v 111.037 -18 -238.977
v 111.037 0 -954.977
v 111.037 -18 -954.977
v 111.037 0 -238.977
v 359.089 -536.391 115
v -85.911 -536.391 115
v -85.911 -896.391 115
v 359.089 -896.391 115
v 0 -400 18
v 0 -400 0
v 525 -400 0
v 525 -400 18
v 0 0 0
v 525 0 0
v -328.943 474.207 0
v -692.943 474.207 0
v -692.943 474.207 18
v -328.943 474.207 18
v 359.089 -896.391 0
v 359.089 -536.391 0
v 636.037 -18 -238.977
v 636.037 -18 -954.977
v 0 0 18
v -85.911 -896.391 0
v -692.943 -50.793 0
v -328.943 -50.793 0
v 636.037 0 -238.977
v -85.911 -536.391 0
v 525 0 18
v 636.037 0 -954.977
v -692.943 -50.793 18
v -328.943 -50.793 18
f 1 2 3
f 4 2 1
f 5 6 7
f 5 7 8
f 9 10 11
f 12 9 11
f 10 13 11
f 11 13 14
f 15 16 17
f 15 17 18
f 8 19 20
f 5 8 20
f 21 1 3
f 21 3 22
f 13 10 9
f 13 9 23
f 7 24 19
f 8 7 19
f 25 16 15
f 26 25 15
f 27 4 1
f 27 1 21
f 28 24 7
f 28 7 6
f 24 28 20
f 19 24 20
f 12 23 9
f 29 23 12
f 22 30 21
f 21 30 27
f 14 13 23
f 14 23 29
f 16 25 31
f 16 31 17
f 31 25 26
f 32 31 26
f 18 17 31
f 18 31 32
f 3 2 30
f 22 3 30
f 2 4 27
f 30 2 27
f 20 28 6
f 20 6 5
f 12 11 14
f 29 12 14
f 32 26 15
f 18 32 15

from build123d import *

# Parameters (mm, degrees)
F0_W     = 525
F0_H     = 400
F1_DEPTH = 18
F2_W     = 525
F2_H     = 716
F3_DEPTH = 18
F4_W     = 364
F4_H     = 525
F5_DEPTH = 18
F6_W     = 445
F6_H     = 360
F7_DEPTH = 115


with BuildPart() as f1:
    # F0 (on Top) → F1 (new body)
    with BuildSketch(Plane.XY):
        with Locations((262.5, -200)):
            Rectangle(F0_W, F0_H)
    extrude(amount=F1_DEPTH)


with BuildPart() as f3:
    # F2 (on Front) → F3 (new body)
    with BuildSketch(Plane.XZ):
        with Locations((373.536677, -596.97741)):
            Rectangle(F2_W, F2_H)
    extrude(amount=F3_DEPTH)


with BuildPart() as f5:
    # F4 (on Top) → F5 (new body)
    with BuildSketch(Plane.XY):
        with Locations((-510.943099, 211.707413)):
            Rectangle(F4_W, F4_H)
    extrude(amount=F5_DEPTH)


with BuildPart() as f7:
    # F6 (on Top) → F7 (new body)
    with BuildSketch(Plane.XY):
        with Locations((136.589084, -716.390855)):
            Rectangle(F6_W, F6_H)
    extrude(amount=F7_DEPTH)


solid = Compound([f1.part, f3.part, f5.part, f7.part])
